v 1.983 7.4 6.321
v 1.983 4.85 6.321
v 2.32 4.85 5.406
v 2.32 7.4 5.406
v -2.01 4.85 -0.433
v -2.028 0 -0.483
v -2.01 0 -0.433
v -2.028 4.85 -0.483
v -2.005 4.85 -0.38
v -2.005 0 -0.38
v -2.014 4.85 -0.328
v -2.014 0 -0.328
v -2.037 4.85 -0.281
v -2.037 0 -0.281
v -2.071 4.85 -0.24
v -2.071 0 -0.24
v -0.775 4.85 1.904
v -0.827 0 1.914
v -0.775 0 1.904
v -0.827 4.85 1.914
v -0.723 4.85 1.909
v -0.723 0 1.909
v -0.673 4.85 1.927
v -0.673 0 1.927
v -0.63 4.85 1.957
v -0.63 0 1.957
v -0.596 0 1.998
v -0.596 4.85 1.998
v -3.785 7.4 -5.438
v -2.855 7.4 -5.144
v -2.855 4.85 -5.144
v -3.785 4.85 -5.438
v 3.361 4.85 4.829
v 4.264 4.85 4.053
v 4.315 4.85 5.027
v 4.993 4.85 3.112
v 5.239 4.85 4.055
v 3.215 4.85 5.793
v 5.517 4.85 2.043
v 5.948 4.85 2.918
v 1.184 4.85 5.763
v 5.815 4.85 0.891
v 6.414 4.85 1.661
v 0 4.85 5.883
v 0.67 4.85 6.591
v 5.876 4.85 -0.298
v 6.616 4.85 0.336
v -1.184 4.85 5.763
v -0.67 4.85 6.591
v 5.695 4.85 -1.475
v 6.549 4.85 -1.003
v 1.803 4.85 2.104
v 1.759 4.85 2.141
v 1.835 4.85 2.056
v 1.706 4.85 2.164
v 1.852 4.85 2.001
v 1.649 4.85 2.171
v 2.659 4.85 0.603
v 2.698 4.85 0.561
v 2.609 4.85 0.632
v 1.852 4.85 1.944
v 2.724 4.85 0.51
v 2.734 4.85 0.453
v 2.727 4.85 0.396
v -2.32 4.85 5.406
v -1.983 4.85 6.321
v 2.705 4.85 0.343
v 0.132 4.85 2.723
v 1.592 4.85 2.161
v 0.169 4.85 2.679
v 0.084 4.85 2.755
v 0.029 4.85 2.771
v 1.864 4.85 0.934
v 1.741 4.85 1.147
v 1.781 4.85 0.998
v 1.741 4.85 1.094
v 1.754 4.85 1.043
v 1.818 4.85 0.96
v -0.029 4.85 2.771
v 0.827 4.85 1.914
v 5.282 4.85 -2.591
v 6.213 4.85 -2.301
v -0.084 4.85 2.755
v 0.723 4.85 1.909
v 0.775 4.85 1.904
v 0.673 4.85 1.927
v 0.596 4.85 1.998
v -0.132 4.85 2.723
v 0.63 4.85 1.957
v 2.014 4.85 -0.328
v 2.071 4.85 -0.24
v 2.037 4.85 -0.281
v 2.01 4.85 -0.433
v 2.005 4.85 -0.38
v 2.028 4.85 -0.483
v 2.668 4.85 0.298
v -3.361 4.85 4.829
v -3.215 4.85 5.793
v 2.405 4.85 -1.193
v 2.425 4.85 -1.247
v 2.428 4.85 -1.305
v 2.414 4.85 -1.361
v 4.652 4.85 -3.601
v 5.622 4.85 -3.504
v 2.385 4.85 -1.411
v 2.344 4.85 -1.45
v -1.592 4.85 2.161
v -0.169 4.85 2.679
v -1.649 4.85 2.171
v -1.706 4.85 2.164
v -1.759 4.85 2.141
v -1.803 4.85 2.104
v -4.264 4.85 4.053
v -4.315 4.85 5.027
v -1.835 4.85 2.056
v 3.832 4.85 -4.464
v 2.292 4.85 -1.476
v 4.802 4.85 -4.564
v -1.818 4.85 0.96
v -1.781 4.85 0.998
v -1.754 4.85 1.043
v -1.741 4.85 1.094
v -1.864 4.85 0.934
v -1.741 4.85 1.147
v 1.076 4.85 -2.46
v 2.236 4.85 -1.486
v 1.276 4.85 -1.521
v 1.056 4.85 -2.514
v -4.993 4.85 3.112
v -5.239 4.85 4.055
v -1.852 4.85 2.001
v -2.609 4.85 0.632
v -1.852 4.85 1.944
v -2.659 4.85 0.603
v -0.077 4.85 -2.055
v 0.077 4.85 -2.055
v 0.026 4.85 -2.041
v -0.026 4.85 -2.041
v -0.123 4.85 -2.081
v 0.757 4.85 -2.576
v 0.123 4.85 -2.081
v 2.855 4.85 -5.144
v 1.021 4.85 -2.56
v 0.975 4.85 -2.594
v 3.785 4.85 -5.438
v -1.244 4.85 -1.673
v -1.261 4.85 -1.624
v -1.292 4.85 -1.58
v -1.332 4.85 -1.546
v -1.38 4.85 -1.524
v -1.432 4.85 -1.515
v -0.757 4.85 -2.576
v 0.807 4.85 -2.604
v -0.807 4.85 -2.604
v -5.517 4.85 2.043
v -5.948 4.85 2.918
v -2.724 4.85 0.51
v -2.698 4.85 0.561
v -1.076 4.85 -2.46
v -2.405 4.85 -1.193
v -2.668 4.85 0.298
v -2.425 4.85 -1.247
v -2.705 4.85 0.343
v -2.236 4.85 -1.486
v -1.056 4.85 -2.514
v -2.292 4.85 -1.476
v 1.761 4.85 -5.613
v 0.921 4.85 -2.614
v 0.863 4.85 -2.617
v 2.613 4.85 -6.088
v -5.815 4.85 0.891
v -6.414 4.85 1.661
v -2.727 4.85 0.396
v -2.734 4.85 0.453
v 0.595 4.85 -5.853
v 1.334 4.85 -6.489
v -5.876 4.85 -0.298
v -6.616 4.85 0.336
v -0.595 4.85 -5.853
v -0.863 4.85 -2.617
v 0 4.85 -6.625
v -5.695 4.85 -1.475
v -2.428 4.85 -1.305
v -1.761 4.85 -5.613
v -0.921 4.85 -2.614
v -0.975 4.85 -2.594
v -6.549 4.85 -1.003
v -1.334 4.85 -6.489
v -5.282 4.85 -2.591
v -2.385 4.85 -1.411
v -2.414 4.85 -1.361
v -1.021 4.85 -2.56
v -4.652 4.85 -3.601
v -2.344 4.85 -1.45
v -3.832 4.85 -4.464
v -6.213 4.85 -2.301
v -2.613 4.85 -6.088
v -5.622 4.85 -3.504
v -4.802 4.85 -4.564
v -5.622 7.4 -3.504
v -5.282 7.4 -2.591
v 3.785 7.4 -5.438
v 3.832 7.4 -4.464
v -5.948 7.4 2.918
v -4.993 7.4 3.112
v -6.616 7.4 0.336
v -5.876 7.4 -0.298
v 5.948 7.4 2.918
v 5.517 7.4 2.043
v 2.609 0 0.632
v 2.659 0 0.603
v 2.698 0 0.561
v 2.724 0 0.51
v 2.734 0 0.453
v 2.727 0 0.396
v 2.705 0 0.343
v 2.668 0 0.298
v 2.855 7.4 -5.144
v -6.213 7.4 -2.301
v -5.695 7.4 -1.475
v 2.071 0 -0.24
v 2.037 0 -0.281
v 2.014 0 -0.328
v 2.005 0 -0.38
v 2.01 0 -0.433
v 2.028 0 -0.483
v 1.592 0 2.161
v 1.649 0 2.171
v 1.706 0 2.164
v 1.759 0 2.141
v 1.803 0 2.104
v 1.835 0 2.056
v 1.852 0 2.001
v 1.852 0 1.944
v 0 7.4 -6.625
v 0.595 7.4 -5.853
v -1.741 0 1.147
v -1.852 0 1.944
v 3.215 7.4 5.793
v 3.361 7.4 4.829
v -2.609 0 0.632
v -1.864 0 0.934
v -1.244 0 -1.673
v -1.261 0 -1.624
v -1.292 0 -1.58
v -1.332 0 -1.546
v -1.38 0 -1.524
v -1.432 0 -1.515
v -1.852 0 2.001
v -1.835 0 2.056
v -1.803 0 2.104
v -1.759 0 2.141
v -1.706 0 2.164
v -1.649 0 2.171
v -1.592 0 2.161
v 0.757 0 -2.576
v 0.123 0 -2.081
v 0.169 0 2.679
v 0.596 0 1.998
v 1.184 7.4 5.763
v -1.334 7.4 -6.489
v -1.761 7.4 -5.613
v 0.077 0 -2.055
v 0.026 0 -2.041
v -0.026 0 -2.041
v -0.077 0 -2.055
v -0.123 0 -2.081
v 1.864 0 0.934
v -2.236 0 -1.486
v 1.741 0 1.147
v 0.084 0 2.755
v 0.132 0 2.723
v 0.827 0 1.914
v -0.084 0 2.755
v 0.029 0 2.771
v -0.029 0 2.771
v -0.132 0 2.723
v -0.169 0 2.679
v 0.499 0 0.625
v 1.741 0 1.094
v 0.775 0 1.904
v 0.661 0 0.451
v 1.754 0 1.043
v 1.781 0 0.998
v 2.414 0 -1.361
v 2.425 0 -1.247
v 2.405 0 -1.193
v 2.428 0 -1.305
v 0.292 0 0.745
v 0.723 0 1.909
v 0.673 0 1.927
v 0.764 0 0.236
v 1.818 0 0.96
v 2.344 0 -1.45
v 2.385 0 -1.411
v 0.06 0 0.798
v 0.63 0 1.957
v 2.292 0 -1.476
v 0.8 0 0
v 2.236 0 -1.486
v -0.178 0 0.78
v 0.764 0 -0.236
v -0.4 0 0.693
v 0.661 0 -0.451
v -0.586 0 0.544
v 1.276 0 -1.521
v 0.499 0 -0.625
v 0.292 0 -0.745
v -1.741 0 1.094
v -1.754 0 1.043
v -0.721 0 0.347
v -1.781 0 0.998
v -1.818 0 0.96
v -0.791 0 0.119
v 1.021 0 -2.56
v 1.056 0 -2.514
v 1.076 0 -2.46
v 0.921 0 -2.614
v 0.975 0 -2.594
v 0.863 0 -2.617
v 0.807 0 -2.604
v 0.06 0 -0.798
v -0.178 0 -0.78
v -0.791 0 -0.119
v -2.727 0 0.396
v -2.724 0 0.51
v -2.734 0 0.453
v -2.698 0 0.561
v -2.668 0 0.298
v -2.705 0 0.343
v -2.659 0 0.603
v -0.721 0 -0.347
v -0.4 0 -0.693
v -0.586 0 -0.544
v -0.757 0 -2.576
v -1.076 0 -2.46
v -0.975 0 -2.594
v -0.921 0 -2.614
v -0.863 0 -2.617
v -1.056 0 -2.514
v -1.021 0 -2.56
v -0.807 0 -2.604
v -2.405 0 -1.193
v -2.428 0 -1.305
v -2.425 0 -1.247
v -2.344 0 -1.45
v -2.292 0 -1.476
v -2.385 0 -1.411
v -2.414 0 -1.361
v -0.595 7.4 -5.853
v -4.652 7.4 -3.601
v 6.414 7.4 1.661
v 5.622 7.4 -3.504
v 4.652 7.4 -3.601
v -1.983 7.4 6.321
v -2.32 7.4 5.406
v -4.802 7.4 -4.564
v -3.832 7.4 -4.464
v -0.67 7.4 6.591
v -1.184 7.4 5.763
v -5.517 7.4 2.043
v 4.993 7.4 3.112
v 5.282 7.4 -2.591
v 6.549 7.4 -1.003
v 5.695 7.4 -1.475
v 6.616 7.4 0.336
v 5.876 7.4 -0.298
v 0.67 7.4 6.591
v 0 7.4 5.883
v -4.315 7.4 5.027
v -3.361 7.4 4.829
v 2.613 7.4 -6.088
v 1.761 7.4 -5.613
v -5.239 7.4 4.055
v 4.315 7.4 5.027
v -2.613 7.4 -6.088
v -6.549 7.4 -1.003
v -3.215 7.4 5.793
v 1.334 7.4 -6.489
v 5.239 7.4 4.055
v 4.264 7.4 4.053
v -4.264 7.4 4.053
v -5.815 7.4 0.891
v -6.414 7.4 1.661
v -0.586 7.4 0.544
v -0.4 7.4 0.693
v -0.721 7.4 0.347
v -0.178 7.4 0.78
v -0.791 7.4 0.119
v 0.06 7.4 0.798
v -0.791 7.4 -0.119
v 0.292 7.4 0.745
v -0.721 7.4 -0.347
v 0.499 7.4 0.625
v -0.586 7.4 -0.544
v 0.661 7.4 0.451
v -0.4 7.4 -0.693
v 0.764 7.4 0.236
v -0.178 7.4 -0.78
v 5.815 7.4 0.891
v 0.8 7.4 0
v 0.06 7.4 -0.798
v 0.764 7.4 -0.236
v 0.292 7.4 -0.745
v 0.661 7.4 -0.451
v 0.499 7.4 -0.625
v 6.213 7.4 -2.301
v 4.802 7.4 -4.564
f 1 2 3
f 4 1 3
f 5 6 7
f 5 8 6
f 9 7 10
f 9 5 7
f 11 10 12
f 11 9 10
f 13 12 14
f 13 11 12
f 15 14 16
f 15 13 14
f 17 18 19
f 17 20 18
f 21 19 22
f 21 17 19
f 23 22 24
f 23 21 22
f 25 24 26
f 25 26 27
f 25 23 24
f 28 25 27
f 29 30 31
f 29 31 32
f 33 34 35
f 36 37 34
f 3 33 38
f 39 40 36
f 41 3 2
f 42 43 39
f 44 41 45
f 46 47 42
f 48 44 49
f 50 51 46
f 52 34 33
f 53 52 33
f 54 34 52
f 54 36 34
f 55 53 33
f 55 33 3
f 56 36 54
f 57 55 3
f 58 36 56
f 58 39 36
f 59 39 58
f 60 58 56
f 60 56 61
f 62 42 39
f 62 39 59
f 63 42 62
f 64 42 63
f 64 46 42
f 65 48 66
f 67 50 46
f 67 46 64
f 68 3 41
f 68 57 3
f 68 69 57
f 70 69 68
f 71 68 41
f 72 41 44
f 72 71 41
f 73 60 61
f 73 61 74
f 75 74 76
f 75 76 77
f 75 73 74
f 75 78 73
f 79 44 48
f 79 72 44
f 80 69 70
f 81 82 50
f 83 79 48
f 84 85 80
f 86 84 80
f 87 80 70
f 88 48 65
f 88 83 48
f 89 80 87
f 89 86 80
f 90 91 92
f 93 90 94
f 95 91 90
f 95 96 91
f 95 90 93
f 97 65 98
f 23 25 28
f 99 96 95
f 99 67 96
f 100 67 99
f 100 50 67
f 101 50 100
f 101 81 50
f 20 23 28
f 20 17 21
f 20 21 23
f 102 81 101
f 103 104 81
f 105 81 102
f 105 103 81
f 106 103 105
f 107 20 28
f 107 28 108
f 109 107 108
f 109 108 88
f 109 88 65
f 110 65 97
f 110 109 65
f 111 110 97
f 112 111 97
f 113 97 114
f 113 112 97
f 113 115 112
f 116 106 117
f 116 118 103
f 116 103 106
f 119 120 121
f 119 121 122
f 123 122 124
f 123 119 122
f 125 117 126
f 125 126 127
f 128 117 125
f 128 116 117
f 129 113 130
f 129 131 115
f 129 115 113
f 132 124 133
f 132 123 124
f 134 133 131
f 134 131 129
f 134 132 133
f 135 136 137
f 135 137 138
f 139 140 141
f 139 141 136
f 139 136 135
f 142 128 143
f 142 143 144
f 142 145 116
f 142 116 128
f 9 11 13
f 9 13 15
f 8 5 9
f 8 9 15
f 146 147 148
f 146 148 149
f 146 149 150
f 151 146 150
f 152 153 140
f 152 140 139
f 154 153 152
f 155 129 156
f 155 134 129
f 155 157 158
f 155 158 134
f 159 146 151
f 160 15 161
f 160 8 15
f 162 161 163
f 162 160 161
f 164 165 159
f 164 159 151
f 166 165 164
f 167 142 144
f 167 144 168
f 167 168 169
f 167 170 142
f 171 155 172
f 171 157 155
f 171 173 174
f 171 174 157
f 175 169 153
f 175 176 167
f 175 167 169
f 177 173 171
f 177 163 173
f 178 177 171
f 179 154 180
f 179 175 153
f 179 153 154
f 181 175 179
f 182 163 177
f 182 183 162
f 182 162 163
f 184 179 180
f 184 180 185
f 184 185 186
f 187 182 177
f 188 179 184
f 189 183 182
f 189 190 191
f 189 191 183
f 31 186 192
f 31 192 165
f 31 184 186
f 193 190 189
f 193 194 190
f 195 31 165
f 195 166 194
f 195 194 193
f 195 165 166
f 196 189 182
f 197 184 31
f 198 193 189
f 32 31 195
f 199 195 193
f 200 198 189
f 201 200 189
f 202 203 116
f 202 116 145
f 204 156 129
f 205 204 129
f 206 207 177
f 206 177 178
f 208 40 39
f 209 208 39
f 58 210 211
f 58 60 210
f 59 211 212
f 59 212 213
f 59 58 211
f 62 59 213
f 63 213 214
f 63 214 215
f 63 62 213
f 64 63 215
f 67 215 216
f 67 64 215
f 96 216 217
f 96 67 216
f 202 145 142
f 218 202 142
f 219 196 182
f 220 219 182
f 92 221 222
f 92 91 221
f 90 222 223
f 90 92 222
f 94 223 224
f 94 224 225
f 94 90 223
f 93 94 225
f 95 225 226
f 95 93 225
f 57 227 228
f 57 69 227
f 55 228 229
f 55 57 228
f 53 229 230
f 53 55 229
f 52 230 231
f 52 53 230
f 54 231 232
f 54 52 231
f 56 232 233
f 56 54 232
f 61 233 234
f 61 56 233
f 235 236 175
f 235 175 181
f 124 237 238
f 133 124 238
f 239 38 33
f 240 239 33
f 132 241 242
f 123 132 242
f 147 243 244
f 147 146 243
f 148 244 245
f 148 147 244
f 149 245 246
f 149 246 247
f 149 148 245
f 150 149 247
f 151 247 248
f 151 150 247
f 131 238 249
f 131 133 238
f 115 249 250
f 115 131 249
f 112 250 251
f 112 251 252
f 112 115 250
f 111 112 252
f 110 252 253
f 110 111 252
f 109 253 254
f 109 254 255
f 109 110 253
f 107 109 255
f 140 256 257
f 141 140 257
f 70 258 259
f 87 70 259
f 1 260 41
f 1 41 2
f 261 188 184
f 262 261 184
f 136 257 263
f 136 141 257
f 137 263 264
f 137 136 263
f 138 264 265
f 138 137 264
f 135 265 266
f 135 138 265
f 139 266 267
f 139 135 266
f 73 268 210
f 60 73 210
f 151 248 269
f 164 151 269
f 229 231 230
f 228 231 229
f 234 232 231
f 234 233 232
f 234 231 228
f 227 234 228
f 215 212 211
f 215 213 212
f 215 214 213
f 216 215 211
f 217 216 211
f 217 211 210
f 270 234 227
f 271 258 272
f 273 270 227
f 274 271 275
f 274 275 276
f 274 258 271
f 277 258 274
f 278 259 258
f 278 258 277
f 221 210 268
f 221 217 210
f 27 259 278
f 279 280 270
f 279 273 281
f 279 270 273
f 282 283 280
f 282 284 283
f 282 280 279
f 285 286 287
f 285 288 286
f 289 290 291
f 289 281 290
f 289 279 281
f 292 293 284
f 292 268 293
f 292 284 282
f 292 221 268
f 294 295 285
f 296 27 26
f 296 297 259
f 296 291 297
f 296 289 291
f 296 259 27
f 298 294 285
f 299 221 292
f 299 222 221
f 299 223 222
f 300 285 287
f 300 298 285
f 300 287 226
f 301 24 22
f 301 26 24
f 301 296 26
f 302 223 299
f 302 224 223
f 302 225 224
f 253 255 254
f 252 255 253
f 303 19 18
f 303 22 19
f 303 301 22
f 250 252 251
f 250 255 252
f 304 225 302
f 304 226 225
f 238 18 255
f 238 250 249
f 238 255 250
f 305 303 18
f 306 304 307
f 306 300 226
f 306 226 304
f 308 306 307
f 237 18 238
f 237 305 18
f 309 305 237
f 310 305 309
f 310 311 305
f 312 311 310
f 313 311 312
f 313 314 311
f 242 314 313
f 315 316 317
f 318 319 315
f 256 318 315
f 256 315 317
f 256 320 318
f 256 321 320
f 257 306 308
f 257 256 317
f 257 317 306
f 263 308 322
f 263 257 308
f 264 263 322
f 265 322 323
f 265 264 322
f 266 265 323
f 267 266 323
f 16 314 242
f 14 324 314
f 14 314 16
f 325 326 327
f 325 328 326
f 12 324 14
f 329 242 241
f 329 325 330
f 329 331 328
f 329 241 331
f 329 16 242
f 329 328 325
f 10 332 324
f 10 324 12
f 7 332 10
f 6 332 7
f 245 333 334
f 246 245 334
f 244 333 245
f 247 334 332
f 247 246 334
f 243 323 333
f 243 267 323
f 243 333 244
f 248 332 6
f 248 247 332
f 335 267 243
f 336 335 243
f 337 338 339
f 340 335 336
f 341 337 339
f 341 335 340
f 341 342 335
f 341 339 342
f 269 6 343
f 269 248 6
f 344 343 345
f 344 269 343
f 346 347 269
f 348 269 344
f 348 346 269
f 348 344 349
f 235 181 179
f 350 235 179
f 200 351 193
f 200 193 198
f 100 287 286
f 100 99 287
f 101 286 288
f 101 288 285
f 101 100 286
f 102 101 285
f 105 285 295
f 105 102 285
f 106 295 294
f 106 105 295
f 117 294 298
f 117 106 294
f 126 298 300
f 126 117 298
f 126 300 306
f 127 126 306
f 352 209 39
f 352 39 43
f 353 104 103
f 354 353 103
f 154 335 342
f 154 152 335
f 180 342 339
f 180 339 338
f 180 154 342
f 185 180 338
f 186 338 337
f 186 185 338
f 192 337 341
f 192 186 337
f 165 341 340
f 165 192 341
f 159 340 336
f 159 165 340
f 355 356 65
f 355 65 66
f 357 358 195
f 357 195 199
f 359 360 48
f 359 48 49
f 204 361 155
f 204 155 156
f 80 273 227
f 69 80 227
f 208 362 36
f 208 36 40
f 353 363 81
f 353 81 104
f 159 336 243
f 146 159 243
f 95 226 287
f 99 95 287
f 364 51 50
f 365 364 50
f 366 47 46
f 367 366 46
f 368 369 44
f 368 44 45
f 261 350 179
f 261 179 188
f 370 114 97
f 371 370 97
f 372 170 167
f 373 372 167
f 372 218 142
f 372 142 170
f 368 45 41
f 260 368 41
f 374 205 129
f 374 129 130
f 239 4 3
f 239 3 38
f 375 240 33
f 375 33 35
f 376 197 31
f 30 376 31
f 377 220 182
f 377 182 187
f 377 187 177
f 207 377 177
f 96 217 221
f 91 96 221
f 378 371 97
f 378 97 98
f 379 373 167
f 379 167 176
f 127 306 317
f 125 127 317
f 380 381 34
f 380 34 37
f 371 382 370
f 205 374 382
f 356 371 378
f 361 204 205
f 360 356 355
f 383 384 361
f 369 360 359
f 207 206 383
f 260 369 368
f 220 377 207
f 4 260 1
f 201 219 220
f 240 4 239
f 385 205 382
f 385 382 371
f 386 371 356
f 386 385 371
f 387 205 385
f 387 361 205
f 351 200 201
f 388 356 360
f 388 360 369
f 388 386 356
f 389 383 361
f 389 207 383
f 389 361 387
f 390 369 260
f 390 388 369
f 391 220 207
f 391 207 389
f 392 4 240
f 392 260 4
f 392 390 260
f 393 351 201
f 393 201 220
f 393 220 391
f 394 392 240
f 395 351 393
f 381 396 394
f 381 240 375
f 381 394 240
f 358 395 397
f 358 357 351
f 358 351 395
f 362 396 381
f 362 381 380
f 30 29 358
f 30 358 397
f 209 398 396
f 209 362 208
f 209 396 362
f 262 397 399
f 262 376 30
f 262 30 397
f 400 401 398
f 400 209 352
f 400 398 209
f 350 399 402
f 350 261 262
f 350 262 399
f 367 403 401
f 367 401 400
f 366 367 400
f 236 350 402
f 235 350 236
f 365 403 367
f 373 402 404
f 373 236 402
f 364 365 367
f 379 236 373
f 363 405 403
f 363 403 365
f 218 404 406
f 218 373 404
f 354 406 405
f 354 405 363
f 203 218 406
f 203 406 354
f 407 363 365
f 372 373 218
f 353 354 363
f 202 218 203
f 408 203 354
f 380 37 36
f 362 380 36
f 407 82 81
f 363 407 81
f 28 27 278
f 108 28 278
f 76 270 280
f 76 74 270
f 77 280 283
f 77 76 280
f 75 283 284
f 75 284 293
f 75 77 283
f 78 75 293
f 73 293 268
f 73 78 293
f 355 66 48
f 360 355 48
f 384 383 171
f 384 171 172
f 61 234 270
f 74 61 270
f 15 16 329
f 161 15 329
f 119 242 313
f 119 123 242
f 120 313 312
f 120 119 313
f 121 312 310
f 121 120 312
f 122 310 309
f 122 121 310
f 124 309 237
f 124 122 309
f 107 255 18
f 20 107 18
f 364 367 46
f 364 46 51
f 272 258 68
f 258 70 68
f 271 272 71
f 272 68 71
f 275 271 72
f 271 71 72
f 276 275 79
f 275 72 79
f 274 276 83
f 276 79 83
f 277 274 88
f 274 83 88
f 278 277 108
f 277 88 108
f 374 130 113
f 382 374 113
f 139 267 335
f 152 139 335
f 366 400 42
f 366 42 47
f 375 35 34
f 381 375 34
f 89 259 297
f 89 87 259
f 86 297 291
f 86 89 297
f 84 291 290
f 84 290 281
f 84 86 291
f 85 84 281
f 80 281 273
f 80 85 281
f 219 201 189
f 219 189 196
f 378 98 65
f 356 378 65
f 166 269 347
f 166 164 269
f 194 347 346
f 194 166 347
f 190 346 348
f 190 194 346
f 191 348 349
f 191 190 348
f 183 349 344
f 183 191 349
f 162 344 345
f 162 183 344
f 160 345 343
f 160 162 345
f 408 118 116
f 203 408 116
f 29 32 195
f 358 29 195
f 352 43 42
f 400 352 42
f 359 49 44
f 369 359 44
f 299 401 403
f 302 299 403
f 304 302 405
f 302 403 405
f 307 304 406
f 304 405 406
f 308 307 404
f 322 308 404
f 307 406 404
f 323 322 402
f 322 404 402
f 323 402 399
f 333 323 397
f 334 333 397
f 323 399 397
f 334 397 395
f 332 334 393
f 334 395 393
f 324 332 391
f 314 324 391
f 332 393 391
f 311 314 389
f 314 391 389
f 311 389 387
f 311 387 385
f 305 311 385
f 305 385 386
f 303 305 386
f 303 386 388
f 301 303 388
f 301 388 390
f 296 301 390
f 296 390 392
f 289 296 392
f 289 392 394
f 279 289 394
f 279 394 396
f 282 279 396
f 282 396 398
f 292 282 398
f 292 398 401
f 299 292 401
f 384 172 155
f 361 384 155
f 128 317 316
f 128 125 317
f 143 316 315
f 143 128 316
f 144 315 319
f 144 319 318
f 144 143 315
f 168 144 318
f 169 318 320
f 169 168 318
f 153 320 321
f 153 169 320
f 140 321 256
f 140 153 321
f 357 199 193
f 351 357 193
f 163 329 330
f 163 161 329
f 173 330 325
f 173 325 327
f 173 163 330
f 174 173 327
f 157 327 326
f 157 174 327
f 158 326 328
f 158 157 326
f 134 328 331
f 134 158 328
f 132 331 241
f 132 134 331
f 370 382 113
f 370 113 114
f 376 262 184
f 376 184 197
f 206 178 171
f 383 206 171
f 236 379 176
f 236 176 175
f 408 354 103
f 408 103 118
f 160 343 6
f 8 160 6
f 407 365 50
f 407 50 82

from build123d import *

# Parameters (mm, degrees)
SKETCH2_R          = 0.8
CUT_EXTRUDE1_DEPTH = 8.4
CUT_EXTRUDE2_DEPTH = 8.4
CIRPATTERN1_COUNT  = 31
CUT_EXTRUDE3_DEPTH = 4.85
CIRPATTERN2_COUNT  = 9
FILLET1_R          = 0.2


with BuildPart() as part:
    # Sketch1 → Revolve1 (revolve)
    with BuildSketch(Plane.XY):
        Polygon((-6.625, 7.4), (-6.625, 4.85), (-2.95, 4.85), (-2.95, 0), (0, 0), (0, 7.4), align=None)
    revolve(axis=Axis((0, 7.4, 0), (0, -1, 0)))

    # Sketch2 → Cut-Extrude1 (cut, through all)
    with BuildSketch(Plane(origin=(0, 7.4, 0), x_dir=(1, 0, 0), z_dir=(0, 1, 0))):
        Circle(SKETCH2_R)
    extrude(amount=-CUT_EXTRUDE1_DEPTH, mode=Mode.SUBTRACT)

    # Sketch4 → Cut-Extrude2 (cut, through all)
    with BuildSketch(Plane(origin=(0, 7.4, 0), x_dir=(1, 0, 0), z_dir=(0, 1, 0))):
        with BuildLine():
            Line((1.333602696, 6.489385861), (0.595196913, 5.853049041))
            Line((0.595196913, 5.853049041), (0, 6.625))
            ThreePointArc((0, 6.625), (0.670240133, 6.591009267), (1.333602696, 6.489385861))
        make_face()
    cut_extrude2 = extrude(amount=-CUT_EXTRUDE2_DEPTH, mode=Mode.SUBTRACT)

    # CirPattern1: Cut-Extrude2 ×31 about axis
    cirpattern1_axis = Axis((0, 0, 0), (0, 1, 0))
    for i in range(1, CIRPATTERN1_COUNT):
        add(cut_extrude2.rotate(cirpattern1_axis, i * 360 / CIRPATTERN1_COUNT), mode=Mode.SUBTRACT)

    # Sketch5 → Cut-Extrude3 (cut)
    with BuildSketch(Plane.XZ):
        with BuildLine():
            Line((0, 2.95), (0.67909598, 1.865800872))
            Line((0.67909598, 1.865800872), (1.896223449, 2.259831107))
            ThreePointArc((1.896223449, 2.259831107), (1.008959423, 2.772093231), (0, 2.95))
        make_face()
    cut_extrude3 = extrude(amount=-CUT_EXTRUDE3_DEPTH, mode=Mode.SUBTRACT)

    # CirPattern2: Cut-Extrude3 ×9 about axis
    cirpattern2_axis = Axis((0, 0, 0), (0, 1, 0))
    for i in range(1, CIRPATTERN2_COUNT):
        add(cut_extrude3.rotate(cirpattern2_axis, i * 360 / CIRPATTERN2_COUNT), mode=Mode.SUBTRACT)

    # Fillet1
    fillet1_edges = [part.edges().sort_by_distance(p)[0] for p in [
        (0, 2.425, 2.95),
        (1.896223449, 2.425, 2.259831107),
        (0.67909598, 2.425, 1.865800872),
        (2.905182871, 2.425, 0.512262124),
        (1.719531385, 2.425, 0.992771908),
        (2.554774941, 2.425, -1.475),
        (1.955378943, 2.425, -0.344786065),
        (1.008959423, 2.425, -2.772093231),
        (-1.008959423, 2.425, -2.772093231),
        (0, 2.425, -1.985543815),
        (-2.554774941, 2.425, -1.475),
        (-1.276282963, 2.425, -1.521014806),
        (-2.905182871, 2.425, 0.512262124),
        (-1.955378943, 2.425, -0.344786065),
        (-1.896223449, 2.425, 2.259831107),
        (-1.719531385, 2.425, 0.992771908),
        (-0.67909598, 2.425, 1.865800872),
    ]]
    fillet(fillet1_edges, radius=FILLET1_R)


solid = part.part
